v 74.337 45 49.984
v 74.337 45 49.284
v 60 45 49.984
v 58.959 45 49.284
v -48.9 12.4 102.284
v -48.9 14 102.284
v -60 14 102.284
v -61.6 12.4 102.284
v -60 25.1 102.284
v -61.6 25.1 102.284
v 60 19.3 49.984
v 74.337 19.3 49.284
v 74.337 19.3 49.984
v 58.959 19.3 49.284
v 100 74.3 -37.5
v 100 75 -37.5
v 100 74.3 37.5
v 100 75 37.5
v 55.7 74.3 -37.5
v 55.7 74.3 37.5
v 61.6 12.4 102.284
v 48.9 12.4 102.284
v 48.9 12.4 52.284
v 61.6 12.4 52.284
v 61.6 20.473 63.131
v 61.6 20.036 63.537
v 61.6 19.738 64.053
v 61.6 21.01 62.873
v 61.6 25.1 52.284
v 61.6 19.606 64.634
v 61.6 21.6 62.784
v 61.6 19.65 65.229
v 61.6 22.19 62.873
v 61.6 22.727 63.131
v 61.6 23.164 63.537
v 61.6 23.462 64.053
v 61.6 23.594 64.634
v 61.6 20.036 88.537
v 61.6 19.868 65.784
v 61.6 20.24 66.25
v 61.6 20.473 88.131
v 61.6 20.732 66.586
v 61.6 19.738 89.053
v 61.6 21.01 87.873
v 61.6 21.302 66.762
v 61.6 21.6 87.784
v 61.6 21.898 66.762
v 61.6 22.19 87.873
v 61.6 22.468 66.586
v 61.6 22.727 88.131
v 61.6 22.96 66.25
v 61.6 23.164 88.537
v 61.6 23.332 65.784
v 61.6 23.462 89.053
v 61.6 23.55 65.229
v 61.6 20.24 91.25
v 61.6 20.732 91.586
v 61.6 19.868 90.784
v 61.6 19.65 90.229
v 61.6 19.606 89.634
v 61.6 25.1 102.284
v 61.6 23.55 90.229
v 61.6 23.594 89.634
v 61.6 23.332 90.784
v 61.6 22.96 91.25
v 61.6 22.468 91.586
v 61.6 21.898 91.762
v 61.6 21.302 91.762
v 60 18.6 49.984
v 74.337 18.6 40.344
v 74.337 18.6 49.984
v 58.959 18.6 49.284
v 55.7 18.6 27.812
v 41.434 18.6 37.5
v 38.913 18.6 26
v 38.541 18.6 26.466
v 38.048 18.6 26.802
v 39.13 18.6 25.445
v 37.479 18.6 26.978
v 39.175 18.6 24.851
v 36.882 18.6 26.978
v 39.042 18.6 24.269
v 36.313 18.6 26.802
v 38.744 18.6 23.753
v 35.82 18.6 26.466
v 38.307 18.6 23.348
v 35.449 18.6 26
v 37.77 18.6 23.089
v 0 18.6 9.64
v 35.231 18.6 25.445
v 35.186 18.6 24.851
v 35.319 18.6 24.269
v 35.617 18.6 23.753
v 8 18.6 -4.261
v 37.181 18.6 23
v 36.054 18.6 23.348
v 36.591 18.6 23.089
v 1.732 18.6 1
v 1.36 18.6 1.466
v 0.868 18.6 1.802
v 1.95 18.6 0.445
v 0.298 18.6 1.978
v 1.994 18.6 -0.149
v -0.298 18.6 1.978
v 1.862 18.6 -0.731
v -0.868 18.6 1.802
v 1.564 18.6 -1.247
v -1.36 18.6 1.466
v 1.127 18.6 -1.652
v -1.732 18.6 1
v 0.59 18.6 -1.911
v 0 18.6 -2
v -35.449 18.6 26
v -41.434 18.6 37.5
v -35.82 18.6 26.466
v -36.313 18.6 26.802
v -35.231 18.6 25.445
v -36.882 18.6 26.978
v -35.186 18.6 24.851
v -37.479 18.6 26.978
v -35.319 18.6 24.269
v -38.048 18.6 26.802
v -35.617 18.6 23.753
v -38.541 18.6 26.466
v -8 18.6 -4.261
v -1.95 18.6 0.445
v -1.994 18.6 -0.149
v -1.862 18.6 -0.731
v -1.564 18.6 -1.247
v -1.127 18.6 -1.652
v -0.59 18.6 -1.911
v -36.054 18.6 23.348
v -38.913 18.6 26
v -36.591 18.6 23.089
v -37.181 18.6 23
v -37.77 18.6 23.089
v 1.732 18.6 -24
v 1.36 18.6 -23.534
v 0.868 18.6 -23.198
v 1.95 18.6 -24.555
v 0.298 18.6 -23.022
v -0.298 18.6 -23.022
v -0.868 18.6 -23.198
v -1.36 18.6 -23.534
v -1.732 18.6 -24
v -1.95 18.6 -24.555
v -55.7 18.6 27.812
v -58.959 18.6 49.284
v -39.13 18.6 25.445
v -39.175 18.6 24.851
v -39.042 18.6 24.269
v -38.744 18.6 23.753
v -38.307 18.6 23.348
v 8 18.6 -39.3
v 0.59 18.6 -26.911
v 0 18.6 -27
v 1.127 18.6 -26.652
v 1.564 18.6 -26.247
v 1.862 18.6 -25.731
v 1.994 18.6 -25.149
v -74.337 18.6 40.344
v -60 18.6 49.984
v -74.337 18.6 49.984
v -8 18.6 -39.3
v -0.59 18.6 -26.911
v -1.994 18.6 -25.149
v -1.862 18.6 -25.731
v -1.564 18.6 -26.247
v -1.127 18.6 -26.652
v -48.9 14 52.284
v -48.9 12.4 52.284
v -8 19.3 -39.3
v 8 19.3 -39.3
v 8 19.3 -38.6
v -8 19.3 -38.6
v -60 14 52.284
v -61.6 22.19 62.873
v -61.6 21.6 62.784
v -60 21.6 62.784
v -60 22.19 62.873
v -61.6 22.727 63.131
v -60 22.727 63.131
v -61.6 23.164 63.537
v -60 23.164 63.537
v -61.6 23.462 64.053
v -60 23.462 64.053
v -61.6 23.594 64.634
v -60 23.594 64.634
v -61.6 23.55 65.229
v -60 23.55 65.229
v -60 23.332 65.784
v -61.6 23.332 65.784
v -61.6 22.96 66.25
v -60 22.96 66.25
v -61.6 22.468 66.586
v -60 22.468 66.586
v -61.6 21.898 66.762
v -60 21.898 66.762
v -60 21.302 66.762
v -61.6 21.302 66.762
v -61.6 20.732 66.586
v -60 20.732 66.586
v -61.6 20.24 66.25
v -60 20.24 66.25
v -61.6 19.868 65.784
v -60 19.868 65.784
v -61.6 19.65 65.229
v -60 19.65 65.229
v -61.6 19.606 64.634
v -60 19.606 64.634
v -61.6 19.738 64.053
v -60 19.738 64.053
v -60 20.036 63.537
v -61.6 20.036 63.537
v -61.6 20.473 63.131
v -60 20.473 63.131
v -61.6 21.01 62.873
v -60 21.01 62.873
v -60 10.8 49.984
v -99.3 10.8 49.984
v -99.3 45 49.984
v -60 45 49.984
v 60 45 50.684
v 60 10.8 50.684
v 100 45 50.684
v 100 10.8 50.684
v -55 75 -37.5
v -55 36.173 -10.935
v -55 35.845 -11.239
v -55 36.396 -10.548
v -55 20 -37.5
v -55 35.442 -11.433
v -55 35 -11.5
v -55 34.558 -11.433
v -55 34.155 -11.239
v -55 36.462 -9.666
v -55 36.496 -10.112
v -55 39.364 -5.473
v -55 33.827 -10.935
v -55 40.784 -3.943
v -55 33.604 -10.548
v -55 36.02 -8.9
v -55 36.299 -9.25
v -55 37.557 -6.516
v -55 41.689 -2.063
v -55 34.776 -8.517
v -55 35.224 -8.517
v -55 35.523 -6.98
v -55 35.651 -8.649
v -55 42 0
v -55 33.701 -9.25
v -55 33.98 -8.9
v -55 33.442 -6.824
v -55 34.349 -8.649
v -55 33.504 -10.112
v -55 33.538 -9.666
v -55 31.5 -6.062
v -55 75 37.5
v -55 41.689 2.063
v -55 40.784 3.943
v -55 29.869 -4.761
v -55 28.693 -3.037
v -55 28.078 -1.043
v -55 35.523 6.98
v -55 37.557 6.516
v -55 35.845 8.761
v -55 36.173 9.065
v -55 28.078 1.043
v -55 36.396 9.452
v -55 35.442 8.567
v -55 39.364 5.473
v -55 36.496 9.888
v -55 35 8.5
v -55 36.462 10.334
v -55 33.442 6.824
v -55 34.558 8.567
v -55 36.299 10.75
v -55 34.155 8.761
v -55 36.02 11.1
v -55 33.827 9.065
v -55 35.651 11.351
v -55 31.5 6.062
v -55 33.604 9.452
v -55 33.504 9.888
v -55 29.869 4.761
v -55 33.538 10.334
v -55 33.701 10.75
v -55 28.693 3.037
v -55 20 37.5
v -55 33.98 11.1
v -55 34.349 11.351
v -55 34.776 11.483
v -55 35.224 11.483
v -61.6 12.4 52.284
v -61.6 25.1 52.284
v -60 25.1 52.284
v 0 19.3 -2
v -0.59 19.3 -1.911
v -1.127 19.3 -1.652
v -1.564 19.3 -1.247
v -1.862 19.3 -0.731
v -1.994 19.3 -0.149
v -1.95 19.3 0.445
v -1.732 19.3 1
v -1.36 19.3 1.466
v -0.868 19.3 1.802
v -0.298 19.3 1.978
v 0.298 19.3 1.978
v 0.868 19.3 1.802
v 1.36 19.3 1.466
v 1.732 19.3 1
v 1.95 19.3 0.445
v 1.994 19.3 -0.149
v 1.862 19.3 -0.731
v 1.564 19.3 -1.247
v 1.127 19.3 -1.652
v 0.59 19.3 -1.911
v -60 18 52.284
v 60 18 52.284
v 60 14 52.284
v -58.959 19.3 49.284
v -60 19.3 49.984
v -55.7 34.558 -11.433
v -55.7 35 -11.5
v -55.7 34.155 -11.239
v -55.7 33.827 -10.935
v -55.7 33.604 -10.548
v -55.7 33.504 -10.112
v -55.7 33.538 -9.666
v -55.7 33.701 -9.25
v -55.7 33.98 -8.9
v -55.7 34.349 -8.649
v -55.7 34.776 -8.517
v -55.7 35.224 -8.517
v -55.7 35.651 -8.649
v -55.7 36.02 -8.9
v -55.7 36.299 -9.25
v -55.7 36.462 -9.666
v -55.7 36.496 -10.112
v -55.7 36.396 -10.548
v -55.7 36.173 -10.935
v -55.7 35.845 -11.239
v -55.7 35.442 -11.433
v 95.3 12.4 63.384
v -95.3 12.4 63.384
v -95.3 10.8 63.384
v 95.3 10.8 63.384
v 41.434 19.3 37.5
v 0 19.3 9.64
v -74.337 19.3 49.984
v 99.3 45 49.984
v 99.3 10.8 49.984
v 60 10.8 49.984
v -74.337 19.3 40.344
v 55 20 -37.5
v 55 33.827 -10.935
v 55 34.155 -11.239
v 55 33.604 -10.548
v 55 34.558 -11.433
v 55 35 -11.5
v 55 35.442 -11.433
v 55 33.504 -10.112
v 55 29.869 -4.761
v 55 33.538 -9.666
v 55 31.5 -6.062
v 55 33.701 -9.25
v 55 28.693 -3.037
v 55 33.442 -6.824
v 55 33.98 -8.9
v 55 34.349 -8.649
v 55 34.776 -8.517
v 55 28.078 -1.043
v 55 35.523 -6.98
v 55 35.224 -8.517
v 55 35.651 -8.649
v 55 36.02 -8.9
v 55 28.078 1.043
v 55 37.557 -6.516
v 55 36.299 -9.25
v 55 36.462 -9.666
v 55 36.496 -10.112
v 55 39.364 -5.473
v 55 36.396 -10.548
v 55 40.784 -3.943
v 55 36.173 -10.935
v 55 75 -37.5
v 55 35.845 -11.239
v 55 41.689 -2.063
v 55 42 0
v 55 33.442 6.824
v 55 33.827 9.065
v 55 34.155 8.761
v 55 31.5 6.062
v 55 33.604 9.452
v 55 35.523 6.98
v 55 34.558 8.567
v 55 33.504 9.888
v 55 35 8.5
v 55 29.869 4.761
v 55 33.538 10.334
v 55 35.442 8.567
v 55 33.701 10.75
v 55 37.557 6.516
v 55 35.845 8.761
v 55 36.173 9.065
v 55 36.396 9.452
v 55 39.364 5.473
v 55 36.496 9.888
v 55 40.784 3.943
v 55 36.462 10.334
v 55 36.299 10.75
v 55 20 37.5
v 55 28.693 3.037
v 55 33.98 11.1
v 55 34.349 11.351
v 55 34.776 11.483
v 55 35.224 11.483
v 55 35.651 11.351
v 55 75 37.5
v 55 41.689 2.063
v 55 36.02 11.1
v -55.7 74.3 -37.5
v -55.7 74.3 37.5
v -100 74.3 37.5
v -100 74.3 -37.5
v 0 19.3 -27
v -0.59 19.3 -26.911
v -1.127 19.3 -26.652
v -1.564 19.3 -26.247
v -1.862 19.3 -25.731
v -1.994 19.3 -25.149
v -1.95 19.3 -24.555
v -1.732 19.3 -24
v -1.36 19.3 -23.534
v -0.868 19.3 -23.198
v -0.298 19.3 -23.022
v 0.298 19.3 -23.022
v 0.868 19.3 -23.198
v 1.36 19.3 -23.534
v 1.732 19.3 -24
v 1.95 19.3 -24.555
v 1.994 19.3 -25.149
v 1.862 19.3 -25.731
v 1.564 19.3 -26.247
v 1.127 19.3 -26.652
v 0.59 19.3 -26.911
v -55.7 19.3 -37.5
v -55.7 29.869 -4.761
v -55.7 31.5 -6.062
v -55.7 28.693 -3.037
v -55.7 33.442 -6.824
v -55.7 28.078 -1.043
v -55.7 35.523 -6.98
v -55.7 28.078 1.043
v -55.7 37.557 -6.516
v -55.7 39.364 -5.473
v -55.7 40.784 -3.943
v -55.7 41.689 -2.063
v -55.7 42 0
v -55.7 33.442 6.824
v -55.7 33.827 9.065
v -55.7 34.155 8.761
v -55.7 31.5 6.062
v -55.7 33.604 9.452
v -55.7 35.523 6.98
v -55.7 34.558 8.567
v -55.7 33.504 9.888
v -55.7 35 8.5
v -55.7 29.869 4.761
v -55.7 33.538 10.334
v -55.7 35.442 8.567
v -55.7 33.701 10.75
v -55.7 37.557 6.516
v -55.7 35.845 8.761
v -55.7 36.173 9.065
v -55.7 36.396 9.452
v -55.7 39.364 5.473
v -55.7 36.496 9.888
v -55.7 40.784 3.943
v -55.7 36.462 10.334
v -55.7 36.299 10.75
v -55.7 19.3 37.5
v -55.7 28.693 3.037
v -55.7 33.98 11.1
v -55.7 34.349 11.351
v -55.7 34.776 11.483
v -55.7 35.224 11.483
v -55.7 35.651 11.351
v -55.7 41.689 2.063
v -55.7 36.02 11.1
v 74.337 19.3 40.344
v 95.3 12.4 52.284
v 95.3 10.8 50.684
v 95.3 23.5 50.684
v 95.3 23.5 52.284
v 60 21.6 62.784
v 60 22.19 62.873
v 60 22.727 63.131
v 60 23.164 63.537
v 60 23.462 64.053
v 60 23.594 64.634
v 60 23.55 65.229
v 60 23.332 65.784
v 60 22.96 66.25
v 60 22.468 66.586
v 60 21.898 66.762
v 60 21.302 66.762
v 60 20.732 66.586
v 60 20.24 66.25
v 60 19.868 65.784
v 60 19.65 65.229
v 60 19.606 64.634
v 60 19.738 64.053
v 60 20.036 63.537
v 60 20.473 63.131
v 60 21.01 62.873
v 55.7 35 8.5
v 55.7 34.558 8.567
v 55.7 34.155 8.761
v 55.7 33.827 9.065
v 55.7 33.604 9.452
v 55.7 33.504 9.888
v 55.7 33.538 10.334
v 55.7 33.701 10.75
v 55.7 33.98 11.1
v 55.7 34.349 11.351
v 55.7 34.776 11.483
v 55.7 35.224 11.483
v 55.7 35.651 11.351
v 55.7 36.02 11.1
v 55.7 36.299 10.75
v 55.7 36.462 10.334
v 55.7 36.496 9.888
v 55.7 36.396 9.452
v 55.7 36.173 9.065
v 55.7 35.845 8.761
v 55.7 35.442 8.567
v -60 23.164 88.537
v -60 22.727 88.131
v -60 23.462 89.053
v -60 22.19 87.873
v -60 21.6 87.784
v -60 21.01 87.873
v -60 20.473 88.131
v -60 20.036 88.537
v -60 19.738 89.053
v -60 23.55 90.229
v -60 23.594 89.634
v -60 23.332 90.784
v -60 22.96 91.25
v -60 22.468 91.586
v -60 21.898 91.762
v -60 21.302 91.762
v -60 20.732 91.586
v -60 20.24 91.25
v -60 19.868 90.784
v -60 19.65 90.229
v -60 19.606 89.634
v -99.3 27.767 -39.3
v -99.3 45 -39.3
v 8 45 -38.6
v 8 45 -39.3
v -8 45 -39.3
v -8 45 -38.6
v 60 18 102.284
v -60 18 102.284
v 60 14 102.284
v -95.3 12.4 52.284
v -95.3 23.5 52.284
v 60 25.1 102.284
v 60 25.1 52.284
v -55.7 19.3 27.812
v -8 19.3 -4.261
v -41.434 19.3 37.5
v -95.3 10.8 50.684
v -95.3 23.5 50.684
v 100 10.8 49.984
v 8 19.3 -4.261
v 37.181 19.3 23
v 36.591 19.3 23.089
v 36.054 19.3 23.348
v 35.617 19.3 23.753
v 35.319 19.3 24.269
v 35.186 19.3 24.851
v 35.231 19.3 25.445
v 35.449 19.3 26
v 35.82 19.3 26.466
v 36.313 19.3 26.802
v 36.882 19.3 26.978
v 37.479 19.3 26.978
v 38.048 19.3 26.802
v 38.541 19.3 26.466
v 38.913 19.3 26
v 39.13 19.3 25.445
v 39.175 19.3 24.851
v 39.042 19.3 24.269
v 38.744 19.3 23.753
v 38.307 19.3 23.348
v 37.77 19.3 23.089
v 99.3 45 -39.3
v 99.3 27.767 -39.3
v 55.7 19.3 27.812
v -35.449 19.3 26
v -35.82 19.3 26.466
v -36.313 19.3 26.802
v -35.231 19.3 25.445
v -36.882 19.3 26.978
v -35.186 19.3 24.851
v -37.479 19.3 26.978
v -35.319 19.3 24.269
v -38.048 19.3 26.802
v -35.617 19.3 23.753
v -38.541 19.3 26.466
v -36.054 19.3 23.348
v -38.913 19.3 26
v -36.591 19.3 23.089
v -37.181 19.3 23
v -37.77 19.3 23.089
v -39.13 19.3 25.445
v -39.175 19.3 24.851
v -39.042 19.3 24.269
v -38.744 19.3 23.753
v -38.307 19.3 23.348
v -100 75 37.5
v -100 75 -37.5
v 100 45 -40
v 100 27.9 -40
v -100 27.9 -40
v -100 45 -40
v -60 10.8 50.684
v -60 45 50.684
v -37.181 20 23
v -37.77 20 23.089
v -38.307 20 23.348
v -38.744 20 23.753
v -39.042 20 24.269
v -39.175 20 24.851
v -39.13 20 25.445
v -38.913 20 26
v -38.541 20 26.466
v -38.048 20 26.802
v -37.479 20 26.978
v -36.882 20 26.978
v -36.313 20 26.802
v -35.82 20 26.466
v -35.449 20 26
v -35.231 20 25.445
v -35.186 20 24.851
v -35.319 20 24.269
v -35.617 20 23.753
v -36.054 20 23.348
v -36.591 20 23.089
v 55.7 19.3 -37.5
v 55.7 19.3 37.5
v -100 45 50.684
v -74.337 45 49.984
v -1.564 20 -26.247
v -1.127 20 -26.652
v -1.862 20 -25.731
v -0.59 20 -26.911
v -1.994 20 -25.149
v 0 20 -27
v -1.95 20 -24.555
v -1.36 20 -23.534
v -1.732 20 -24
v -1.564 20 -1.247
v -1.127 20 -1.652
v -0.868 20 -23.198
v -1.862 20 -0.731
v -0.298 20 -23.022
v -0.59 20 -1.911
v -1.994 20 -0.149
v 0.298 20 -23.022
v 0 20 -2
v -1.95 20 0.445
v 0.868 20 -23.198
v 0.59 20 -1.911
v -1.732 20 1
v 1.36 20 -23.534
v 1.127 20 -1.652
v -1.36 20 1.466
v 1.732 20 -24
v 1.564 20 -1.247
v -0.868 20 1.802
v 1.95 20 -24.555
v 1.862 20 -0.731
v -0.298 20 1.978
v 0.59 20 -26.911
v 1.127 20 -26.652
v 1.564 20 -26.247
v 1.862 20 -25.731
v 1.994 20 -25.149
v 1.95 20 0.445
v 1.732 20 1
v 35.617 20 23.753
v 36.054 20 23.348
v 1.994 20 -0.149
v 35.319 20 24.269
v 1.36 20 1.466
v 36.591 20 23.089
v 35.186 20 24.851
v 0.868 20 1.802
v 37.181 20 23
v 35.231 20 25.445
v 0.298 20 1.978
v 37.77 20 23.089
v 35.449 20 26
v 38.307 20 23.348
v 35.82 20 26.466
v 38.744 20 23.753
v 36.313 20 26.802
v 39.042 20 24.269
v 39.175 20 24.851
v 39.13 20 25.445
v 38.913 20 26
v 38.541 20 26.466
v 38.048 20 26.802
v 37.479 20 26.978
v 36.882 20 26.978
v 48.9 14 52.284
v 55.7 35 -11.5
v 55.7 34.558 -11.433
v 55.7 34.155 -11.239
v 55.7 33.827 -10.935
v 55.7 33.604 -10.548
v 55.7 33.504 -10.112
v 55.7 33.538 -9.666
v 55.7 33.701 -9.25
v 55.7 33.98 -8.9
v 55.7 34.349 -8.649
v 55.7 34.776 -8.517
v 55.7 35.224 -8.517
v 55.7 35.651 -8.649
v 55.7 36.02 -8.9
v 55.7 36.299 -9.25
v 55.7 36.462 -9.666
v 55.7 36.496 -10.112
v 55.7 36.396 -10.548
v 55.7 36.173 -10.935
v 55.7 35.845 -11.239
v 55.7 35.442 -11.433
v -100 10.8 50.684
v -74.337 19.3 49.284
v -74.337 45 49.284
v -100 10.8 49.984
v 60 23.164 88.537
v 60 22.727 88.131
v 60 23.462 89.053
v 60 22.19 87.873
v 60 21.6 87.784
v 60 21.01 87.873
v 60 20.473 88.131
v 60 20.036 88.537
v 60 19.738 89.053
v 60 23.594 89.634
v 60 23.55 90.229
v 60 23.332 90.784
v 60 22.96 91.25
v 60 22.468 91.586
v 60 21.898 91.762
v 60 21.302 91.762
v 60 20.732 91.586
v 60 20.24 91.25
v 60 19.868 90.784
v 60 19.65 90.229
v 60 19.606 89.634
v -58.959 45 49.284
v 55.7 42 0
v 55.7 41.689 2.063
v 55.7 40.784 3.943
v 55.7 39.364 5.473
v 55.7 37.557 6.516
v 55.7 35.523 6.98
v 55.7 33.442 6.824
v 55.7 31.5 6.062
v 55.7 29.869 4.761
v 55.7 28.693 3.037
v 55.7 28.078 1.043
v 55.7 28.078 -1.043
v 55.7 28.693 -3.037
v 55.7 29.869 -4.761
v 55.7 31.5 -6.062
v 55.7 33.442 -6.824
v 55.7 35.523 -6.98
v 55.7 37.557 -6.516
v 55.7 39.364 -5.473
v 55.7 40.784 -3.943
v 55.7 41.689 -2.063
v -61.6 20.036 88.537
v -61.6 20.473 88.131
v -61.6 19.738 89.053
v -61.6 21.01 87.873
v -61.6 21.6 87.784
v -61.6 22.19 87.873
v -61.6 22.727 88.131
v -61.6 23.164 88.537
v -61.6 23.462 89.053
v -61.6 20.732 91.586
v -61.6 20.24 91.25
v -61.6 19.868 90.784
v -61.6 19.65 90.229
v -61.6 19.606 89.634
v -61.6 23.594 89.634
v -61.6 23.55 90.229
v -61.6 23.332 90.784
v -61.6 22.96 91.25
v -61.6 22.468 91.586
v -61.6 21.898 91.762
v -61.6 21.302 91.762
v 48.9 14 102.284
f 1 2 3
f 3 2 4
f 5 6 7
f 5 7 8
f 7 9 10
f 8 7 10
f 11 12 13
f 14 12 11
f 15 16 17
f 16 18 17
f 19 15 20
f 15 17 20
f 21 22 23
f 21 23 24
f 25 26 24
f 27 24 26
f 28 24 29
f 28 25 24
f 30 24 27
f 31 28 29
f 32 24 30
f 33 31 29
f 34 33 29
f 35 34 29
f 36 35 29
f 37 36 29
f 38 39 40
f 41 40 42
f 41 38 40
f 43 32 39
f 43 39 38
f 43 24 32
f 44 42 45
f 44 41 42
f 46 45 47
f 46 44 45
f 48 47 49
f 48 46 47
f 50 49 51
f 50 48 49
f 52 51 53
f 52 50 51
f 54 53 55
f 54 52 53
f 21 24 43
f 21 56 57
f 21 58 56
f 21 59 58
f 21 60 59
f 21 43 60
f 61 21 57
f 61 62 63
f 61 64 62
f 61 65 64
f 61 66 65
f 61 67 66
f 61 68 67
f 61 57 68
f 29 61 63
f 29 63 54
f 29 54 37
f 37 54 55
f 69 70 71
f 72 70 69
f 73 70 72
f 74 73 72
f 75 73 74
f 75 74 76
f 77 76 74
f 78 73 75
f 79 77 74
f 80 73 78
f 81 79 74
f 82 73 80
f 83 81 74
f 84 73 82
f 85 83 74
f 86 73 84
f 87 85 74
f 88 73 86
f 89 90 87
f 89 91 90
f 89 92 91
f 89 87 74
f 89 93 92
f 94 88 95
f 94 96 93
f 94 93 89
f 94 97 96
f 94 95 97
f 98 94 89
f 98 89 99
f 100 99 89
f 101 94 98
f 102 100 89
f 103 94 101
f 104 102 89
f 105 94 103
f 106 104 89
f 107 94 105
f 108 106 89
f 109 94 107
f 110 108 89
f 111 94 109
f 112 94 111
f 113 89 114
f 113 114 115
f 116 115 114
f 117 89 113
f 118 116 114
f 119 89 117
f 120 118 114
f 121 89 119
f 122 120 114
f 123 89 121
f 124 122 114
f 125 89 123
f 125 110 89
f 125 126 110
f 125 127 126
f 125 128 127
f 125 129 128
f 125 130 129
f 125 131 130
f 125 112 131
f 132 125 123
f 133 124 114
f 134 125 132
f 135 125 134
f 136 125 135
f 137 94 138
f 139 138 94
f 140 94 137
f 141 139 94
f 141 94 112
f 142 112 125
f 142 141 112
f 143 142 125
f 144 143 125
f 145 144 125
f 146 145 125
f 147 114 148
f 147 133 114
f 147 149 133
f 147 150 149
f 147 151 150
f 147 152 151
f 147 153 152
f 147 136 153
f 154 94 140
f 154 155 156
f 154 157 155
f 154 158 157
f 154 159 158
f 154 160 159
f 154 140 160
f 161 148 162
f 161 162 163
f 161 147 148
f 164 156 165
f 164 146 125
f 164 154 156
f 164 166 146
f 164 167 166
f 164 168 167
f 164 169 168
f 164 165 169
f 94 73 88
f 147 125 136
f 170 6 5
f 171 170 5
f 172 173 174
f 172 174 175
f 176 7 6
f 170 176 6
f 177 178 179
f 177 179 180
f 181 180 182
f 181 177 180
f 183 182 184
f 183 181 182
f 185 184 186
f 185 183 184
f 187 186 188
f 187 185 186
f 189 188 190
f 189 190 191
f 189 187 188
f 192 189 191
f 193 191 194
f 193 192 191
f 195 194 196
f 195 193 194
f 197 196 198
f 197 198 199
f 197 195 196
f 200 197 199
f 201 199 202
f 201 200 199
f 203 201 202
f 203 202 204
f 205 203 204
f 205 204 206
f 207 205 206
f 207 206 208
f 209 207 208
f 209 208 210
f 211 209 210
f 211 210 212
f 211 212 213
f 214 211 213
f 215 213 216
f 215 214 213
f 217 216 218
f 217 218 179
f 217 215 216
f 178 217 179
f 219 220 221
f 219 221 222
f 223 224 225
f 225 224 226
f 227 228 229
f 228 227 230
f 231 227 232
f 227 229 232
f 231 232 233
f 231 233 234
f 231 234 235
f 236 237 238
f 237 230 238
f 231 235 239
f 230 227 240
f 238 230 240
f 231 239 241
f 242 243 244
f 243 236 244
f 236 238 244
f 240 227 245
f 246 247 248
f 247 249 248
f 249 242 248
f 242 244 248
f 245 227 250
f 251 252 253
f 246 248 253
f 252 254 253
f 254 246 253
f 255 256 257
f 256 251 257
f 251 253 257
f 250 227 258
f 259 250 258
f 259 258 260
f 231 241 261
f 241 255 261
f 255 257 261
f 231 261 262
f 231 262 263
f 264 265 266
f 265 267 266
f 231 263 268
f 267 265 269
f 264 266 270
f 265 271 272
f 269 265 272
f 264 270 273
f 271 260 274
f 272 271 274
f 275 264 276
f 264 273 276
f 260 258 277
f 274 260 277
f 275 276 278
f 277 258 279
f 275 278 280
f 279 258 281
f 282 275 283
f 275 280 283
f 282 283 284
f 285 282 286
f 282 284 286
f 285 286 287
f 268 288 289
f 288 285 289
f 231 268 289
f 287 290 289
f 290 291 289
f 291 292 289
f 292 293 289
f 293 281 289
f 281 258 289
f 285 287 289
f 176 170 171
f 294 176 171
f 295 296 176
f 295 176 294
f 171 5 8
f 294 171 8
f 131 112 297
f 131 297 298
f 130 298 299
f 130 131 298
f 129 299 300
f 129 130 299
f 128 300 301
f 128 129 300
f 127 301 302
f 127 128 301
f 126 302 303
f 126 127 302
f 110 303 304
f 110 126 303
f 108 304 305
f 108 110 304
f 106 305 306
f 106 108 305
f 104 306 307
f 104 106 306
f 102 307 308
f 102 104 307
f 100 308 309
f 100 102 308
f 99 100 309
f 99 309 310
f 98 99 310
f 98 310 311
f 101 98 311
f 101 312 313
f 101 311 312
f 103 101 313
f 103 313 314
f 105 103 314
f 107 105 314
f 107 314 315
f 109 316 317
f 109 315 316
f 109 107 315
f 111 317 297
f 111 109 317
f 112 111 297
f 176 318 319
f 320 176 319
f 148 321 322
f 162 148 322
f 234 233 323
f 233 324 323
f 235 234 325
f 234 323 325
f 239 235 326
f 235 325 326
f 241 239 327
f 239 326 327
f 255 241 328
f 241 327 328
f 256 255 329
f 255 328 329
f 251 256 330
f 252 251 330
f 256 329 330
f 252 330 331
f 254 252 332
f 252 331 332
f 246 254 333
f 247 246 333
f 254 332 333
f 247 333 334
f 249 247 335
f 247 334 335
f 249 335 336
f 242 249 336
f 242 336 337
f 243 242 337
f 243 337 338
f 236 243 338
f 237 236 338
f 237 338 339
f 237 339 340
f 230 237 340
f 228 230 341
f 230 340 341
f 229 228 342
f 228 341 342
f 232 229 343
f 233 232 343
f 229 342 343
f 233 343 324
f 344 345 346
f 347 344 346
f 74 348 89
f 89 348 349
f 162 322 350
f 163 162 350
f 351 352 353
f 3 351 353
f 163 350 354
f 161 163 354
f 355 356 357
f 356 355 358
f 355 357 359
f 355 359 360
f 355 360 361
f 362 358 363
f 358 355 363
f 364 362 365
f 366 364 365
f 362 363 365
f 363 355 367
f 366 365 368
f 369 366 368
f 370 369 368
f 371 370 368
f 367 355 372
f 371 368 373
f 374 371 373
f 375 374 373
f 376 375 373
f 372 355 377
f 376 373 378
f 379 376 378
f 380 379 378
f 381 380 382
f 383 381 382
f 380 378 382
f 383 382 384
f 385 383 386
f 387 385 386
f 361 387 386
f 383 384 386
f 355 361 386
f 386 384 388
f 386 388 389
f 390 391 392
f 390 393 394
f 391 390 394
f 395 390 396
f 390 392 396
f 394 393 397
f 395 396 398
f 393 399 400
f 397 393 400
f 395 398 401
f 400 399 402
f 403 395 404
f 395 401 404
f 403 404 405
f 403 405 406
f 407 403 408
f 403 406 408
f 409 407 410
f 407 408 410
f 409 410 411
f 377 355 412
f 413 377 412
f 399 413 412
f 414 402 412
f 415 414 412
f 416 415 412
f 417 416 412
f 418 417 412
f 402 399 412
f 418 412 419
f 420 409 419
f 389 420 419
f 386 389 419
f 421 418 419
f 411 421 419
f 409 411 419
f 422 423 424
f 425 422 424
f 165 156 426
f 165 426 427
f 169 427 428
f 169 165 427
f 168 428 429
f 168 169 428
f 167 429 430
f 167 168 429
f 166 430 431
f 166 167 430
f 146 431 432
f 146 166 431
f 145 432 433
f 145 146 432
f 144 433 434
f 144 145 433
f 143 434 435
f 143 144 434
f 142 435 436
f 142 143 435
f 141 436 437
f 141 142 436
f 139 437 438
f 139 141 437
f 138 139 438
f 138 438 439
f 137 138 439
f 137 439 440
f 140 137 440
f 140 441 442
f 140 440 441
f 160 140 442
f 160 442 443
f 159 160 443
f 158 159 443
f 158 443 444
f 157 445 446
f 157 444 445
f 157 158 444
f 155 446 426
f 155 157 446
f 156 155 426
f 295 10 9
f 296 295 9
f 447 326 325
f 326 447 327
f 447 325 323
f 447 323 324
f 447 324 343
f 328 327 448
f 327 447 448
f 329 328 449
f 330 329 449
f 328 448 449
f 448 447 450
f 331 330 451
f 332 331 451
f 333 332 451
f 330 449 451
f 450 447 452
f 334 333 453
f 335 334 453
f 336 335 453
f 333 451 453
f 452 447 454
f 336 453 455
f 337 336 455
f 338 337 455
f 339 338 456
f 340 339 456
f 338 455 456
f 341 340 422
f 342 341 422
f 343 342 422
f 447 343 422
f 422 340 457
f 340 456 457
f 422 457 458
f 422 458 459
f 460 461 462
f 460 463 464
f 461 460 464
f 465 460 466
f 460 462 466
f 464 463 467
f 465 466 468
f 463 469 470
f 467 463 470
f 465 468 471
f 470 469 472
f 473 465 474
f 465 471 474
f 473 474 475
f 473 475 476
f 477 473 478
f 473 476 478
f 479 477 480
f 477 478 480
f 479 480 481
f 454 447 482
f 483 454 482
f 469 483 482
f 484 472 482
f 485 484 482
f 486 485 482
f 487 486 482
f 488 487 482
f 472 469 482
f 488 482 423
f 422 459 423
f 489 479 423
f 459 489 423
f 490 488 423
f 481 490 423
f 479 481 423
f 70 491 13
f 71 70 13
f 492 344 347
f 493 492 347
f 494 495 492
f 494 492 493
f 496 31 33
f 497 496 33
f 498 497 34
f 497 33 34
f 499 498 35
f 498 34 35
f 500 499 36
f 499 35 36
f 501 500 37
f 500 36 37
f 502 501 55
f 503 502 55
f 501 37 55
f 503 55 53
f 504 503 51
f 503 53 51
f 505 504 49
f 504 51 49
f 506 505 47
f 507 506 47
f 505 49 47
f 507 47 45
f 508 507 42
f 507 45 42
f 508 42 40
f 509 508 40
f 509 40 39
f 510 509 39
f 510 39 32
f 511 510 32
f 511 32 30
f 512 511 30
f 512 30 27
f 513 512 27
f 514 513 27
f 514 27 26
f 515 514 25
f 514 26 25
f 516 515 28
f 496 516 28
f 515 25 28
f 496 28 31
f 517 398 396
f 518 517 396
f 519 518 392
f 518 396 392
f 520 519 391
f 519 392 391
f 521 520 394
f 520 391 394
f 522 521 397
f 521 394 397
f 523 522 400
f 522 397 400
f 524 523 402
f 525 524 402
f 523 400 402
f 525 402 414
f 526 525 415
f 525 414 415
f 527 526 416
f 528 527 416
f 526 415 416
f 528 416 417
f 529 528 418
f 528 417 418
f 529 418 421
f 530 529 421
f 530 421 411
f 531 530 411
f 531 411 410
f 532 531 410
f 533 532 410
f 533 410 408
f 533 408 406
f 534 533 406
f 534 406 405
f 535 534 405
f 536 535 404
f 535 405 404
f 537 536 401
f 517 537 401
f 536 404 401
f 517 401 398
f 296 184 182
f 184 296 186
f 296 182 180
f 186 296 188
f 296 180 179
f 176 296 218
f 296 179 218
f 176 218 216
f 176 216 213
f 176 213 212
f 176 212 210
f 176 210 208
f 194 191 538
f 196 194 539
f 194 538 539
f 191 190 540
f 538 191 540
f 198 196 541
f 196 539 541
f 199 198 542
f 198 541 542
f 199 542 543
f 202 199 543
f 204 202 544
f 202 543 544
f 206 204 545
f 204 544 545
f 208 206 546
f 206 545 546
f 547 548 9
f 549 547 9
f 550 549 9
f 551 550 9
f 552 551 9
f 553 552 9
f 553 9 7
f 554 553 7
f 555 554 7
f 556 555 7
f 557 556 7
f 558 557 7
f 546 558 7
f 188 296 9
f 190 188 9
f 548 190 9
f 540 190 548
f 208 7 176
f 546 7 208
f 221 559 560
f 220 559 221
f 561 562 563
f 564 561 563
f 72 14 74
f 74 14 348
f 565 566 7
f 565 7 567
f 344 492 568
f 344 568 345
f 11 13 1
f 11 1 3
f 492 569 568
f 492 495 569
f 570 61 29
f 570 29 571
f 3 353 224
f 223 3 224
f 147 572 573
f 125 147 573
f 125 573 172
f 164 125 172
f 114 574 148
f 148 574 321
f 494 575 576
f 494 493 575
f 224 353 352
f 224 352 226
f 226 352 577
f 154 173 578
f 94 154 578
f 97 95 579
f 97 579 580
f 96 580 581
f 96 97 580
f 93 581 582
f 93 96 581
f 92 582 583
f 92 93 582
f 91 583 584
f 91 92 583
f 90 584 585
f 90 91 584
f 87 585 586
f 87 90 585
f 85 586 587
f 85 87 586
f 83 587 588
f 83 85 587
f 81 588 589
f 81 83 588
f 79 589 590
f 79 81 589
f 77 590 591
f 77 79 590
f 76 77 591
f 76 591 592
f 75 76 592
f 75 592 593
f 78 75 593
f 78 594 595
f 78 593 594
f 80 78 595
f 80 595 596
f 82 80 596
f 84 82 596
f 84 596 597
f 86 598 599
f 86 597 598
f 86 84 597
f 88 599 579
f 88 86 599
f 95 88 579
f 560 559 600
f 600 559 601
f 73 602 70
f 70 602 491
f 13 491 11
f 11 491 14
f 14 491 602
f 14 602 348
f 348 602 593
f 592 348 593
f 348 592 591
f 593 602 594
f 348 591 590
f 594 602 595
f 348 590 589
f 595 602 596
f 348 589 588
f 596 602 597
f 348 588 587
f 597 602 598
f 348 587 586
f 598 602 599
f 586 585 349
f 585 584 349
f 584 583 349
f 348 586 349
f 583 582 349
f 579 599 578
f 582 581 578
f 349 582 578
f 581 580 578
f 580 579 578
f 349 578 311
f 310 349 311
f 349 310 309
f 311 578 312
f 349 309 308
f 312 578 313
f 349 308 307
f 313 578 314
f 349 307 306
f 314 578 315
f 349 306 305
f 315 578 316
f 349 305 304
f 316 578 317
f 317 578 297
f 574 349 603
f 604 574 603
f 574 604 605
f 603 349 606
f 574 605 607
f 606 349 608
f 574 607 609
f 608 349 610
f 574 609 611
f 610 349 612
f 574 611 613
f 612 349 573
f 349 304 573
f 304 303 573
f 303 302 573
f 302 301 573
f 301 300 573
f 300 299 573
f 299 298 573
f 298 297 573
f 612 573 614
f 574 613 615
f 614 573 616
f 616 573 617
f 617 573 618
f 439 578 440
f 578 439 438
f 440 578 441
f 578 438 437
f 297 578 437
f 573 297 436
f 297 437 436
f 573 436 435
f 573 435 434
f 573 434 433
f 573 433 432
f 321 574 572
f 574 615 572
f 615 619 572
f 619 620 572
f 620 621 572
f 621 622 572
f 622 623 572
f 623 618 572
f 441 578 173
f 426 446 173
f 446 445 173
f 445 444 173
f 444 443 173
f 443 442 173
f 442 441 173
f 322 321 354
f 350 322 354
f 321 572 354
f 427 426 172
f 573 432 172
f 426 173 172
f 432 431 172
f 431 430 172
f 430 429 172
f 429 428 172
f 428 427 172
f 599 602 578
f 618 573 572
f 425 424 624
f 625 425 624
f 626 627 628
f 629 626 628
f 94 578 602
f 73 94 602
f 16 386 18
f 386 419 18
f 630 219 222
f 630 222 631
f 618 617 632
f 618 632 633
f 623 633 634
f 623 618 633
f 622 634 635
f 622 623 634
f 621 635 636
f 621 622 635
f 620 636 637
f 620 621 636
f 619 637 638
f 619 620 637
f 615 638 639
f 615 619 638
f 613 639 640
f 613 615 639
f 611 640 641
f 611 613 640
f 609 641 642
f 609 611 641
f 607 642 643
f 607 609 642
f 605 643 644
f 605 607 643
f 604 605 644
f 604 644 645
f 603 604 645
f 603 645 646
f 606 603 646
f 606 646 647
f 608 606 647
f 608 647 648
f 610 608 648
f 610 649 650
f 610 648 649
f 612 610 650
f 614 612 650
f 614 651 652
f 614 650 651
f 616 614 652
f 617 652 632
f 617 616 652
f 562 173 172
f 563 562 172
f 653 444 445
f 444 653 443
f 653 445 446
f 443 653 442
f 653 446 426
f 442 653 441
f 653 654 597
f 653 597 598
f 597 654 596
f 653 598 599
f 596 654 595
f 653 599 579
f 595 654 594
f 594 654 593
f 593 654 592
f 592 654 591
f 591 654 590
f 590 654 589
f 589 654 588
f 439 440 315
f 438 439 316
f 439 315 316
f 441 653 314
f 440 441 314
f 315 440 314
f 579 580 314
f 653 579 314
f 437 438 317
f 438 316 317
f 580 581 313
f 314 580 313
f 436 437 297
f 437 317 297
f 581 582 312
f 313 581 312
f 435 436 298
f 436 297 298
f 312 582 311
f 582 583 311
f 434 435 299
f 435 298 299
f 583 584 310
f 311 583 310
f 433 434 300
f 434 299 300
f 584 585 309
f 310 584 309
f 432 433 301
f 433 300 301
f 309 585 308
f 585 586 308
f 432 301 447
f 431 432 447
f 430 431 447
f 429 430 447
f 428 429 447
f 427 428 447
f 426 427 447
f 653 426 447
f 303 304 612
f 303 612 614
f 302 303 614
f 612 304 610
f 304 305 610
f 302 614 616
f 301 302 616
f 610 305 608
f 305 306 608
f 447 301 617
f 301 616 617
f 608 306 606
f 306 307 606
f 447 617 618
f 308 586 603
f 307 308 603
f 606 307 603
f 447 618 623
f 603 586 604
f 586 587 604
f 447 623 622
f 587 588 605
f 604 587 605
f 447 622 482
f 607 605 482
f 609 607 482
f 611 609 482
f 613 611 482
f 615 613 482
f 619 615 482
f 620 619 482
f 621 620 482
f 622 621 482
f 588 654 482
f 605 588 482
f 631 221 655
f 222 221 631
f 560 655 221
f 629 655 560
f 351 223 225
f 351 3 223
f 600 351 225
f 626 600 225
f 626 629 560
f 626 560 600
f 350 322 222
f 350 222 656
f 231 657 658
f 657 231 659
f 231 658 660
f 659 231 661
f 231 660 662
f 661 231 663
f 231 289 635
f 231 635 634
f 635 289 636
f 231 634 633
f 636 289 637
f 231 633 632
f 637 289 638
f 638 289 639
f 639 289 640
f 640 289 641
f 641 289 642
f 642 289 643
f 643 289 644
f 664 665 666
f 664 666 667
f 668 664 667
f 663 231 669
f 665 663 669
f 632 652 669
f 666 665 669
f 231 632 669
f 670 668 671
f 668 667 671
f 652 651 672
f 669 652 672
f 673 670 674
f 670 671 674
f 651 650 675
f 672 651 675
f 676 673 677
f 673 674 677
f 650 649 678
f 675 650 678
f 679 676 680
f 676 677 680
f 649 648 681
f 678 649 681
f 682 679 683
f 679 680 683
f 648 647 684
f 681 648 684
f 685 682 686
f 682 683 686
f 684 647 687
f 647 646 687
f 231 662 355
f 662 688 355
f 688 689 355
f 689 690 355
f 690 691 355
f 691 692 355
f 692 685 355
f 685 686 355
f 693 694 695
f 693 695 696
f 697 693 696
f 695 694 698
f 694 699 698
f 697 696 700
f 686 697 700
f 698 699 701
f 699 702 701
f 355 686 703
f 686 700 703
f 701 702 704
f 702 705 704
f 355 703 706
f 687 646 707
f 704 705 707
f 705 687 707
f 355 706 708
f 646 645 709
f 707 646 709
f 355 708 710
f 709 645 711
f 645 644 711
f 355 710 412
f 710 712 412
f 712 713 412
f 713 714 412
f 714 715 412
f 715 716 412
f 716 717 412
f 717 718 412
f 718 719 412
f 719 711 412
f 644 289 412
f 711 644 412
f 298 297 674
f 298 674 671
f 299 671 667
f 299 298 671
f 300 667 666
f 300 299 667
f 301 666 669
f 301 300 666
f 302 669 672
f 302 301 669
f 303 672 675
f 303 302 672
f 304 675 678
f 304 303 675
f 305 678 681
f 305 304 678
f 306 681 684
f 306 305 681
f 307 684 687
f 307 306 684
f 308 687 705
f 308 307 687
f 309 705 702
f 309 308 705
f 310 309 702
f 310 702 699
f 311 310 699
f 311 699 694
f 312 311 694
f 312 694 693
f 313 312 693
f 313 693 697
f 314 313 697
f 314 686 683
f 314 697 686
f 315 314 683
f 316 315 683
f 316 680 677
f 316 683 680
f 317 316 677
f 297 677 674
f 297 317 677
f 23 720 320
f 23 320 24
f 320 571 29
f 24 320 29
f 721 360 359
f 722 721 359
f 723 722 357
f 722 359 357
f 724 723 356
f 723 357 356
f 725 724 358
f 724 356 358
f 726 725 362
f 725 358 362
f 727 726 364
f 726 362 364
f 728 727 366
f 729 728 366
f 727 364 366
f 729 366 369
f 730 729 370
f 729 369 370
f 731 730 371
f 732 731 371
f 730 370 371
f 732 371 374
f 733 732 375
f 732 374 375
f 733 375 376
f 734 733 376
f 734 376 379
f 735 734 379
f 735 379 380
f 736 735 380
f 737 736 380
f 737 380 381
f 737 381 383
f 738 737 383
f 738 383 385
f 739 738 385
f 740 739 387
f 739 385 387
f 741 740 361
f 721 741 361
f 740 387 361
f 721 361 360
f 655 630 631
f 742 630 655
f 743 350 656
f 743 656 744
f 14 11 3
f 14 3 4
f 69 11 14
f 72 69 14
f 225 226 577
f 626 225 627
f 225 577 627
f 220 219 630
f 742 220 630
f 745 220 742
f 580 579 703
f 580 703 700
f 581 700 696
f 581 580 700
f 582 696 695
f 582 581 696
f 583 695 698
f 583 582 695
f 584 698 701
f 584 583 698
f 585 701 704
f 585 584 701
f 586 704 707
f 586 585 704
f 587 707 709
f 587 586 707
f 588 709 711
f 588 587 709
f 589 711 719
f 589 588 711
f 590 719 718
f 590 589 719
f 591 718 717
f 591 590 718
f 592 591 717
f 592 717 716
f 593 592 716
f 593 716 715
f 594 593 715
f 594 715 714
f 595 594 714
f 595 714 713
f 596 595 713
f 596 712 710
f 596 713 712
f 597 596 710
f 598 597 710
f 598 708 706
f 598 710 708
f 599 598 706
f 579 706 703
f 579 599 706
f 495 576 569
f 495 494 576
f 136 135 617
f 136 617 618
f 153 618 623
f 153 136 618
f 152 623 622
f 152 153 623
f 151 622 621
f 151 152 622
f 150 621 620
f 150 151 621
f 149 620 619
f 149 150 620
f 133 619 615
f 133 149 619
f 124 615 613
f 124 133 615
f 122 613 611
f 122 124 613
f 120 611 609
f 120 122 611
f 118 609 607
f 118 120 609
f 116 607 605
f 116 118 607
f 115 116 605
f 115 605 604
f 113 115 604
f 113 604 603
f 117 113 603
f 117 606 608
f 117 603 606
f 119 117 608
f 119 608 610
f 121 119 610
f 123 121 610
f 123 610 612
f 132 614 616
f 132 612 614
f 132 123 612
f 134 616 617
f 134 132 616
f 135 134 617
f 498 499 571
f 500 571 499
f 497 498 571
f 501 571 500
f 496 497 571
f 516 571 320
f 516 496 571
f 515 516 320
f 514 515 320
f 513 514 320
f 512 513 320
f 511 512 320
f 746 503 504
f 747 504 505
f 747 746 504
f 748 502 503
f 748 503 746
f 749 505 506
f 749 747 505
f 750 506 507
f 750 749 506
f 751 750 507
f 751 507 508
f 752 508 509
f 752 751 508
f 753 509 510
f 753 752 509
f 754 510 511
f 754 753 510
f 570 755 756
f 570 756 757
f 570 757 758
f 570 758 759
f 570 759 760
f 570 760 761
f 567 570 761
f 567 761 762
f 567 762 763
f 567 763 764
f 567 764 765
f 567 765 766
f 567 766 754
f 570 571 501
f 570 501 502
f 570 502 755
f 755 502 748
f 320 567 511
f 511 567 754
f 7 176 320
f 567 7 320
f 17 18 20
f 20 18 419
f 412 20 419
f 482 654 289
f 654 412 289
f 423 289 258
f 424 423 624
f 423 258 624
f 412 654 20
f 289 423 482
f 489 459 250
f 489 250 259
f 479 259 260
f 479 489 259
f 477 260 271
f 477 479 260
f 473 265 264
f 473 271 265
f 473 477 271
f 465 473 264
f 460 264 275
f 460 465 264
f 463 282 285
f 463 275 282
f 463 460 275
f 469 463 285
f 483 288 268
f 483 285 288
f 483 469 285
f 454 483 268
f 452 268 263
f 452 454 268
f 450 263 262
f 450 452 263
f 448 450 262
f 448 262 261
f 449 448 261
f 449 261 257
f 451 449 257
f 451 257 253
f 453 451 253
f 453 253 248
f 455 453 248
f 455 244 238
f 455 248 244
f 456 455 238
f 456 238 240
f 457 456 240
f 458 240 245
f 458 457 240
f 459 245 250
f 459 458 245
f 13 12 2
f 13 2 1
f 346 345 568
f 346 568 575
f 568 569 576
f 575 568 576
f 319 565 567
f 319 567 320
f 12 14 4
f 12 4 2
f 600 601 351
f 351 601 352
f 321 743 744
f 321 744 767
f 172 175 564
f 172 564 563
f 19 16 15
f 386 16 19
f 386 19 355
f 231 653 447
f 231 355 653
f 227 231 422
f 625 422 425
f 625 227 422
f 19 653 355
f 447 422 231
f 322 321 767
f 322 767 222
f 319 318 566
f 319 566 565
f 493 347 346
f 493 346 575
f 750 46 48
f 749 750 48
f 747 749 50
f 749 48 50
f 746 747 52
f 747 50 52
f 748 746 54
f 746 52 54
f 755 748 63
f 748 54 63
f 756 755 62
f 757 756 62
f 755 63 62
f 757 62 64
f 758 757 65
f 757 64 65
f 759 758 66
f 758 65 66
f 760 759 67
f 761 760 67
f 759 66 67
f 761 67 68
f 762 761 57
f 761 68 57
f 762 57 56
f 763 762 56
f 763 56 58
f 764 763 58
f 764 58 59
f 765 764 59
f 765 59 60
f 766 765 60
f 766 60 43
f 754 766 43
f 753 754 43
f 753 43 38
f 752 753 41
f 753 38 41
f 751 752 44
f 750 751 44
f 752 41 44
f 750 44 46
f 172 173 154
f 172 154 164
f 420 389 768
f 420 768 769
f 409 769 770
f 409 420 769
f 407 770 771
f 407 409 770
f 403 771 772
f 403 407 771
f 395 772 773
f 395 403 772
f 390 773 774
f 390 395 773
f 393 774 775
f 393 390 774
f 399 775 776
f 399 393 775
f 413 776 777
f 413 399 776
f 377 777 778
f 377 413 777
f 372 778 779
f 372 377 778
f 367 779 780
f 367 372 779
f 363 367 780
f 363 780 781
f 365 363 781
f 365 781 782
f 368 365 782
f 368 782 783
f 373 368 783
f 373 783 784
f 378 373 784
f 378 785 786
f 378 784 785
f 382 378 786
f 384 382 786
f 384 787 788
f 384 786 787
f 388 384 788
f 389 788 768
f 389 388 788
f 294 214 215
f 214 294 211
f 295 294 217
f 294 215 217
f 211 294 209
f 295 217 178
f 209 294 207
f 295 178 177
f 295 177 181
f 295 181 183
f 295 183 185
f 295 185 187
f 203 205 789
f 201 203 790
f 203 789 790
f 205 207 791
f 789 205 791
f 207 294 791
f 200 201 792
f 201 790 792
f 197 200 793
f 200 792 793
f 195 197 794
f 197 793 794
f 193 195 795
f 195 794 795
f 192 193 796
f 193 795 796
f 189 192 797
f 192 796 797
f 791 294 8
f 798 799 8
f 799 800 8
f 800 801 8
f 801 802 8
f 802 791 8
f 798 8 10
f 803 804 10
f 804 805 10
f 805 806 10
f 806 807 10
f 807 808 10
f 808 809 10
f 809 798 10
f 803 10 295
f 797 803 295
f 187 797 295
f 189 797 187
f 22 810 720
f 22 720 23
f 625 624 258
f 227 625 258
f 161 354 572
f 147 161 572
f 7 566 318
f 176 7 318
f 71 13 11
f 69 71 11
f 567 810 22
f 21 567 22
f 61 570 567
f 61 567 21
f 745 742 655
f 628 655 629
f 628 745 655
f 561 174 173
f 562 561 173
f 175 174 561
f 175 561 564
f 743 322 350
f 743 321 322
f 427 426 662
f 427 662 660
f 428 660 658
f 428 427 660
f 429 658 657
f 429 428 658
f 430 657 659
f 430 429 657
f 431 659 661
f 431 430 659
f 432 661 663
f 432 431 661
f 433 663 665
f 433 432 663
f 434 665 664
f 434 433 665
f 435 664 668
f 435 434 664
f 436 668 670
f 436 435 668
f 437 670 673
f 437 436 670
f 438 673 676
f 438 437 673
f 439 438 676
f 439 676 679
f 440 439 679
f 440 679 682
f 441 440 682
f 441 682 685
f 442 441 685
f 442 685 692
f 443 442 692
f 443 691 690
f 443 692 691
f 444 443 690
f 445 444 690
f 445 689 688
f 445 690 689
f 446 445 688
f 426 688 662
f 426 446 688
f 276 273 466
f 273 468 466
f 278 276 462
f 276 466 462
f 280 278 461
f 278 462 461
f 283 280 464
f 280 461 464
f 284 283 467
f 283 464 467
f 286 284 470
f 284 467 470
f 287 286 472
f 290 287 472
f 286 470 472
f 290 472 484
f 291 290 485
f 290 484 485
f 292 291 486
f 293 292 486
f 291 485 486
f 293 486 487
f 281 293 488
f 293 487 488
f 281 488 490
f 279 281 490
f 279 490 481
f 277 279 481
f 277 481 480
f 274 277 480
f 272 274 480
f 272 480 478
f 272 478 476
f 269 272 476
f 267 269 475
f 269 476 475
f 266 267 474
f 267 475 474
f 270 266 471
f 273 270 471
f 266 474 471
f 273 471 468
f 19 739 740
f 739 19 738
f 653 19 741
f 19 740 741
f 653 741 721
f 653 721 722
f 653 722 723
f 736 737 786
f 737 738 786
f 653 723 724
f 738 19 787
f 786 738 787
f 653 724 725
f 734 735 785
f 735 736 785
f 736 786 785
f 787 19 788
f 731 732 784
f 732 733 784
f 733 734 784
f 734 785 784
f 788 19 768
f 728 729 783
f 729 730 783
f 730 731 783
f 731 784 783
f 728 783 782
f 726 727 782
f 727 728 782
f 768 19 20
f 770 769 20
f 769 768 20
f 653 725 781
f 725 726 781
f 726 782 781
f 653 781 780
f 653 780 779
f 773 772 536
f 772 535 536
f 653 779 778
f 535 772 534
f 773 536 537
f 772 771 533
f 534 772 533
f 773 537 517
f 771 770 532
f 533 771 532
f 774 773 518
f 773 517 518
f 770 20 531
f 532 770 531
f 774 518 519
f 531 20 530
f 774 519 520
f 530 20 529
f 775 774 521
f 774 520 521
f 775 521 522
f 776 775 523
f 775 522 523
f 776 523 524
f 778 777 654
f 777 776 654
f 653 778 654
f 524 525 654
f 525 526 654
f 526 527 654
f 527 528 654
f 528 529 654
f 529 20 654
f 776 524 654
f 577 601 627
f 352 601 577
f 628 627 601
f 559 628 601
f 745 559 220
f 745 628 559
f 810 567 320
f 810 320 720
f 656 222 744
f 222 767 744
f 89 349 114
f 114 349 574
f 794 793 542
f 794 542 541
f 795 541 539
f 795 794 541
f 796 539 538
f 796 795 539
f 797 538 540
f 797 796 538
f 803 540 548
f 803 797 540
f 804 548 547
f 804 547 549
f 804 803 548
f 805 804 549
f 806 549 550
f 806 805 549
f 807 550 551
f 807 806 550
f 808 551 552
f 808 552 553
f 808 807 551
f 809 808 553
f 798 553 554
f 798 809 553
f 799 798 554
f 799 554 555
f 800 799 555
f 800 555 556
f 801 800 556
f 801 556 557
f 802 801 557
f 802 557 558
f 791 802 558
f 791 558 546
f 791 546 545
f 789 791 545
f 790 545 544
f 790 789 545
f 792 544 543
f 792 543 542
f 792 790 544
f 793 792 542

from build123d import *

# Parameters (mm, degrees)
PLATFORM_START                 = 18
SKETCH2_W                      = 120
SKETCH2_H                      = 50
PLATFORM_DEPTH                 = 4
ALU_ANGLE_PLATFORM_REST_DEPTH  = 95.3
PLATFORM_ANGLE_RH_DEPTH        = 50
CUT_EXTRUDE2_START             = -61.6
SKETCH19_R                     = 2
CUT_EXTRUDE2_DEPTH             = 1.6
OUTER_START                    = 10.8
OUTER_FRAME_DEPTH              = 34.2
CUT_EXTRUDE_THIN1_REACH        = 151.957
EXTRUDE_THIN3_DEPTH            = 37.5
CUT_EXTRUDE3_DEPTH             = 162.514725016
CUT_EXTRUDE3_DEPTH_BACK        = 162.514725016
DRIVE_AXLE_HOLES_R             = 7
DRIVE_AXLE_HOLES_R_2           = 5
SKETCH26_W                     = 1.5
SKETCH26_H                     = 155.7
F_3_0MM_DOWEL_HOLE1_AT_2_COUNT = 2
F_3_0MM_DOWEL_HOLE1_AT_2_PITCH = 20
SKETCH27_W                     = 16
SKETCH27_H                     = 0.7
SKETCH27_H_2                   = 1.1
BOSS_EXTRUDE1_DEPTH            = 0.7
SKETCH27_3_W                   = 16
SKETCH27_3_H                   = 0.7
BOSS_EXTRUDE2_DEPTH            = 25.7
BOSS_EXTRUDE2_2_DEPTH          = 25.7
BOSS_EXTRUDE2_3_DEPTH          = 25.7
CUT_EXTRUDE4_DEPTH             = 154.254710848
CUT_EXTRUDE4_DEPTH_BACK        = 154.254710848
SKETCH28_R                     = 2


with BuildPart() as part:
    # Sketch2 → Platform (new body)
    with BuildSketch(Plane(origin=(0, 0, 0), x_dir=(1, 0, 0), z_dir=(0, 1, 0)).offset(PLATFORM_START)):
        with Locations((0, -77.28394985)):
            Rectangle(SKETCH2_W, SKETCH2_H)
    extrude(amount=-PLATFORM_DEPTH)


with BuildPart() as body_2:
    # Sketch3 → Alu Angle Platform Rest (new, symmetric)
    with BuildSketch(Plane(origin=(0, 0, 0), x_dir=(0, 0, -1), z_dir=(1, 0, 0))):
        Polygon((-52.28394985, 23.5), (-52.28394985, 12.4), (-63.38394985, 12.4), (-63.38394985, 10.8), (-50.68394985, 10.8), (-50.68394985, 23.5), align=None)
    extrude(amount=ALU_ANGLE_PLATFORM_REST_DEPTH, both=True)


with BuildPart() as body_3:
    # Sketch8 → Platform Angle RH (new body)
    with BuildSketch(Plane.XY.offset(102.28394985)):
        Polygon((-48.9, 12.4), (-61.6, 12.4), (-61.6, 25.1), (-60, 25.1), (-60, 14), (-48.9, 14), align=None)
    extrude(amount=-PLATFORM_ANGLE_RH_DEPTH)

    # Sketch19 → Cut-Extrude2 (cut)
    with BuildSketch(Plane(origin=(0, 0, 0), x_dir=(0, 0, -1), z_dir=(1, 0, 0)).offset(CUT_EXTRUDE2_START)):
        with Locations((-89.78394985, 21.6)):
            Circle(SKETCH19_R)
        with Locations((-64.78394985, 21.6)):
            Circle(SKETCH19_R)
    extrude(amount=CUT_EXTRUDE2_DEPTH, mode=Mode.SUBTRACT)


with BuildPart() as body_4:
    # Platform Angle LH: mirrored copy
    add(body_3.part.mirror(Plane(origin=(0, 0, 0), x_dir=(0, 0, 1), z_dir=(1, 0, 0))))


with BuildPart() as body_5:
    # Sketch20 → Outer Frame (new body)
    with BuildSketch(Plane(origin=(0, 0, 0), x_dir=(1, 0, 0), z_dir=(0, 1, 0)).offset(OUTER_START)):
        Polygon((-60, -50.68394985), (-100, -50.68394985), (-100, 40), (0, 40), (0, 39.3), (-99.3, 39.3), (-99.3, -49.98394985), (-60, -49.98394985), align=None)
    extrude(amount=OUTER_FRAME_DEPTH)

    # Cut-Extrude-Thin1: up to this face of the body (flat: up to its plane)
    cut_extrude_thin1_end = Plane(body_5.part.faces().sort_by_distance((-100, 27.9, 5.341974925))[0])
    # Sketch22 → Cut-Extrude-Thin1 (cut, up to the picked face)
    with BuildSketch(Plane(origin=(0, 0, 0), x_dir=(0, 0, -1), z_dir=(1, 0, 0)), mode=Mode.PRIVATE) as cut_extrude_thin1_sk1:
        Polygon((40, 27.9), (-49.98394985, 10.8), (-49.853264905, 10.112307158), (40.130684946, 27.212307158), align=None)
    cut_extrude_thin1_tool1 = split(extrude(cut_extrude_thin1_sk1.sketch, amount=-CUT_EXTRUDE_THIN1_REACH, mode=Mode.PRIVATE), bisect_by=cut_extrude_thin1_end, keep=Keep.BOTH, mode=Mode.PRIVATE)
    add(cut_extrude_thin1_tool1.solids().sort_by(Axis((0, 19.006154, 4.926632), (-1, 0, 0)))[0], mode=Mode.SUBTRACT)


with BuildPart() as body_6:
    # of the pieces the cut leaves, the one that is kept (cut_extrude_thin1_keep)
    add(body_5.part.solids().sort_by_distance((-60, 10.8, 50.68394985))[0])

    # Mirror1: body 6 across plane


with BuildPart() as body_6_1:
    add(body_6.part)
    add(body_6.part.mirror(Plane(origin=(0, 0, 0), x_dir=(0, 0, 1), z_dir=(1, 0, 0))))


with BuildPart() as body_6_2:
    # Sketch24 → Extrude-Thin3 (new, symmetric)
    with BuildSketch(Plane.XY):
        Polygon((-100, 75), (-55, 75), (-55, 20), (55, 20), (55, 75), (100, 75), (100, 74.3), (55.7, 74.3), (55.7, 19.3), (-55.7, 19.3), (-55.7, 74.3), (-100, 74.3), align=None)
    extrude(amount=EXTRUDE_THIN3_DEPTH, both=True)

    # Drive Axle Holes → Cut-Extrude3 (cut, two sides: drawn at the far end of the back side and taken through both)
    # profile 1 of 2: a face of its own
    with BuildSketch(Plane(origin=(0, 0, 0), x_dir=(0, 0, -1), z_dir=(1, 0, 0)).offset(-CUT_EXTRUDE3_DEPTH_BACK)):
        with Locations(Location((0, 35, 0), (0, 0, 90))):
            Circle(DRIVE_AXLE_HOLES_R)
        with Locations((0, 35)):
            Circle(DRIVE_AXLE_HOLES_R_2, mode=Mode.SUBTRACT)
    # profile 2 of 2: a face of its own
    with BuildSketch(Plane(origin=(0, 0, 0), x_dir=(0, 0, -1), z_dir=(1, 0, 0)).offset(-CUT_EXTRUDE3_DEPTH_BACK)):
        with Locations((0, 35)):
            Circle(DRIVE_AXLE_HOLES_R_2)
    extrude(amount=CUT_EXTRUDE3_DEPTH + CUT_EXTRUDE3_DEPTH_BACK, mode=Mode.SUBTRACT)

    # Sketch26 → Ø3.0mm Dowel Hole1 (revolve, cut)
    with BuildSketch(Plane(origin=(55.7, 35, 10), x_dir=(0, 0, -1), z_dir=(0, 1, 0))):
        with Locations((0.75, 77.85)):
            Rectangle(SKETCH26_W, SKETCH26_H)
    f_3_0mm_dowel_hole1 = revolve(axis=Axis((62.05, 35, 10), (-1, 0, 0)), mode=Mode.SUBTRACT)

    # Ø3.0mm Dowel Hole1 at 2: Ø3.0mm Dowel Hole1 ×2
    with Locations(*[(0, 0, -i * F_3_0MM_DOWEL_HOLE1_AT_2_PITCH) for i in range(1, F_3_0MM_DOWEL_HOLE1_AT_2_COUNT)]):
        add(f_3_0mm_dowel_hole1, mode=Mode.SUBTRACT)


with BuildPart() as body_7:
    # Sketch27 → Boss-Extrude1 (new body)
    with BuildSketch(Plane(origin=(0, 19.3, 0), x_dir=(-1, 0, 0), z_dir=(0, -1, 0))):
        with Locations((0, 38.95)):
            Rectangle(SKETCH27_W, SKETCH27_H)
        with Locations((0, 38.05)):
            Rectangle(SKETCH27_W, SKETCH27_H_2)
        Polygon((55.7, -37.5), (55.7, -27.812063669), (8, 4.261141559), (8, 37.5), (-8, 37.5), (-8, 4.261141559), (-55.7, -27.812063669), (-55.7, -37.5), (-41.43358596, -37.5), (0, -9.640295476), (41.43358596, -37.5), align=None)
        Polygon((74.337266604, -49.28394985), (74.337266604, -40.343654375), (55.7, -27.812063669), (55.7, -37.5), (41.43358596, -37.5), (58.958944085, -49.28394985), align=None)
        Polygon((74.337266604, -49.98394985), (74.337266604, -49.28394985), (58.958944085, -49.28394985), (60, -49.98394985), align=None)
        Polygon((-58.958944085, -49.28394985), (-41.43358596, -37.5), (-55.7, -37.5), (-55.7, -27.812063669), (-74.337266604, -40.343654375), (-74.337266604, -49.28394985), align=None)
        Polygon((-60, -49.98394985), (-58.958944085, -49.28394985), (-74.337266604, -49.28394985), (-74.337266604, -49.98394985), align=None)
    extrude(amount=BOSS_EXTRUDE1_DEPTH)


with BuildPart() as body_8:
    # Sketch27<3> → Boss-Extrude2 (new body)
    with BuildSketch(Plane(origin=(0, 19.3, 0), x_dir=(-1, 0, 0), z_dir=(0, -1, 0))):
        with Locations((0, 38.95)):
            Rectangle(SKETCH27_3_W, SKETCH27_3_H)
    extrude(amount=-BOSS_EXTRUDE2_DEPTH)


with BuildPart() as body_9:
    # Sketch27<3> → Boss-Extrude2 2 (new body)
    with BuildSketch(Plane(origin=(0, 19.3, 0), x_dir=(-1, 0, 0), z_dir=(0, -1, 0))):
        Polygon((-60, -49.98394985), (-58.958944085, -49.28394985), (-74.337266604, -49.28394985), (-74.337266604, -49.98394985), align=None)
    extrude(amount=-BOSS_EXTRUDE2_2_DEPTH)


with BuildPart() as body_10:
    # Sketch27<3> → Boss-Extrude2 3 (new body)
    with BuildSketch(Plane(origin=(0, 19.3, 0), x_dir=(-1, 0, 0), z_dir=(0, -1, 0))):
        Polygon((74.337266604, -49.98394985), (74.337266604, -49.28394985), (58.958944085, -49.28394985), (60, -49.98394985), align=None)
    extrude(amount=-BOSS_EXTRUDE2_3_DEPTH)


with BuildPart() as cut_extrude4_tool:
    # Sketch28 → Cut-Extrude4 (new, two sides: drawn at the far end of the back side and taken through both)
    with BuildSketch(Plane(origin=(0, 20, 0), x_dir=(1, 0, 0), z_dir=(0, 1, 0)).offset(-CUT_EXTRUDE4_DEPTH_BACK)):
        with Locations(Location((0, 0, 0), (0, 0, 90))):
            Circle(SKETCH28_R)
        with Locations(Location((0, 25, 0), (0, 0, 90))):
            Circle(SKETCH28_R)
        with Locations(Location((-37.180568376, -25, 0), (0, 0, 90))):
            Circle(SKETCH28_R)
        with Locations(Location((37.180568376, -25, 0), (0, 0, 90))):
            Circle(SKETCH28_R)
    extrude(amount=CUT_EXTRUDE4_DEPTH + CUT_EXTRUDE4_DEPTH_BACK)


with BuildPart() as body_6_2_1:
    add(body_6_2.part)

    # Cut-Extrude4: cut by cut_extrude4_tool
    add(cut_extrude4_tool.part, mode=Mode.SUBTRACT)


with BuildPart() as body_7_1:
    add(body_7.part)

    # Cut-Extrude4: cut by cut_extrude4_tool
    add(cut_extrude4_tool.part, mode=Mode.SUBTRACT)


solid = Compound([part.part, body_2.part, body_3.part, body_4.part, body_6_1.part, body_8.part, body_9.part, body_10.part, body_6_2_1.part, body_7_1.part])
